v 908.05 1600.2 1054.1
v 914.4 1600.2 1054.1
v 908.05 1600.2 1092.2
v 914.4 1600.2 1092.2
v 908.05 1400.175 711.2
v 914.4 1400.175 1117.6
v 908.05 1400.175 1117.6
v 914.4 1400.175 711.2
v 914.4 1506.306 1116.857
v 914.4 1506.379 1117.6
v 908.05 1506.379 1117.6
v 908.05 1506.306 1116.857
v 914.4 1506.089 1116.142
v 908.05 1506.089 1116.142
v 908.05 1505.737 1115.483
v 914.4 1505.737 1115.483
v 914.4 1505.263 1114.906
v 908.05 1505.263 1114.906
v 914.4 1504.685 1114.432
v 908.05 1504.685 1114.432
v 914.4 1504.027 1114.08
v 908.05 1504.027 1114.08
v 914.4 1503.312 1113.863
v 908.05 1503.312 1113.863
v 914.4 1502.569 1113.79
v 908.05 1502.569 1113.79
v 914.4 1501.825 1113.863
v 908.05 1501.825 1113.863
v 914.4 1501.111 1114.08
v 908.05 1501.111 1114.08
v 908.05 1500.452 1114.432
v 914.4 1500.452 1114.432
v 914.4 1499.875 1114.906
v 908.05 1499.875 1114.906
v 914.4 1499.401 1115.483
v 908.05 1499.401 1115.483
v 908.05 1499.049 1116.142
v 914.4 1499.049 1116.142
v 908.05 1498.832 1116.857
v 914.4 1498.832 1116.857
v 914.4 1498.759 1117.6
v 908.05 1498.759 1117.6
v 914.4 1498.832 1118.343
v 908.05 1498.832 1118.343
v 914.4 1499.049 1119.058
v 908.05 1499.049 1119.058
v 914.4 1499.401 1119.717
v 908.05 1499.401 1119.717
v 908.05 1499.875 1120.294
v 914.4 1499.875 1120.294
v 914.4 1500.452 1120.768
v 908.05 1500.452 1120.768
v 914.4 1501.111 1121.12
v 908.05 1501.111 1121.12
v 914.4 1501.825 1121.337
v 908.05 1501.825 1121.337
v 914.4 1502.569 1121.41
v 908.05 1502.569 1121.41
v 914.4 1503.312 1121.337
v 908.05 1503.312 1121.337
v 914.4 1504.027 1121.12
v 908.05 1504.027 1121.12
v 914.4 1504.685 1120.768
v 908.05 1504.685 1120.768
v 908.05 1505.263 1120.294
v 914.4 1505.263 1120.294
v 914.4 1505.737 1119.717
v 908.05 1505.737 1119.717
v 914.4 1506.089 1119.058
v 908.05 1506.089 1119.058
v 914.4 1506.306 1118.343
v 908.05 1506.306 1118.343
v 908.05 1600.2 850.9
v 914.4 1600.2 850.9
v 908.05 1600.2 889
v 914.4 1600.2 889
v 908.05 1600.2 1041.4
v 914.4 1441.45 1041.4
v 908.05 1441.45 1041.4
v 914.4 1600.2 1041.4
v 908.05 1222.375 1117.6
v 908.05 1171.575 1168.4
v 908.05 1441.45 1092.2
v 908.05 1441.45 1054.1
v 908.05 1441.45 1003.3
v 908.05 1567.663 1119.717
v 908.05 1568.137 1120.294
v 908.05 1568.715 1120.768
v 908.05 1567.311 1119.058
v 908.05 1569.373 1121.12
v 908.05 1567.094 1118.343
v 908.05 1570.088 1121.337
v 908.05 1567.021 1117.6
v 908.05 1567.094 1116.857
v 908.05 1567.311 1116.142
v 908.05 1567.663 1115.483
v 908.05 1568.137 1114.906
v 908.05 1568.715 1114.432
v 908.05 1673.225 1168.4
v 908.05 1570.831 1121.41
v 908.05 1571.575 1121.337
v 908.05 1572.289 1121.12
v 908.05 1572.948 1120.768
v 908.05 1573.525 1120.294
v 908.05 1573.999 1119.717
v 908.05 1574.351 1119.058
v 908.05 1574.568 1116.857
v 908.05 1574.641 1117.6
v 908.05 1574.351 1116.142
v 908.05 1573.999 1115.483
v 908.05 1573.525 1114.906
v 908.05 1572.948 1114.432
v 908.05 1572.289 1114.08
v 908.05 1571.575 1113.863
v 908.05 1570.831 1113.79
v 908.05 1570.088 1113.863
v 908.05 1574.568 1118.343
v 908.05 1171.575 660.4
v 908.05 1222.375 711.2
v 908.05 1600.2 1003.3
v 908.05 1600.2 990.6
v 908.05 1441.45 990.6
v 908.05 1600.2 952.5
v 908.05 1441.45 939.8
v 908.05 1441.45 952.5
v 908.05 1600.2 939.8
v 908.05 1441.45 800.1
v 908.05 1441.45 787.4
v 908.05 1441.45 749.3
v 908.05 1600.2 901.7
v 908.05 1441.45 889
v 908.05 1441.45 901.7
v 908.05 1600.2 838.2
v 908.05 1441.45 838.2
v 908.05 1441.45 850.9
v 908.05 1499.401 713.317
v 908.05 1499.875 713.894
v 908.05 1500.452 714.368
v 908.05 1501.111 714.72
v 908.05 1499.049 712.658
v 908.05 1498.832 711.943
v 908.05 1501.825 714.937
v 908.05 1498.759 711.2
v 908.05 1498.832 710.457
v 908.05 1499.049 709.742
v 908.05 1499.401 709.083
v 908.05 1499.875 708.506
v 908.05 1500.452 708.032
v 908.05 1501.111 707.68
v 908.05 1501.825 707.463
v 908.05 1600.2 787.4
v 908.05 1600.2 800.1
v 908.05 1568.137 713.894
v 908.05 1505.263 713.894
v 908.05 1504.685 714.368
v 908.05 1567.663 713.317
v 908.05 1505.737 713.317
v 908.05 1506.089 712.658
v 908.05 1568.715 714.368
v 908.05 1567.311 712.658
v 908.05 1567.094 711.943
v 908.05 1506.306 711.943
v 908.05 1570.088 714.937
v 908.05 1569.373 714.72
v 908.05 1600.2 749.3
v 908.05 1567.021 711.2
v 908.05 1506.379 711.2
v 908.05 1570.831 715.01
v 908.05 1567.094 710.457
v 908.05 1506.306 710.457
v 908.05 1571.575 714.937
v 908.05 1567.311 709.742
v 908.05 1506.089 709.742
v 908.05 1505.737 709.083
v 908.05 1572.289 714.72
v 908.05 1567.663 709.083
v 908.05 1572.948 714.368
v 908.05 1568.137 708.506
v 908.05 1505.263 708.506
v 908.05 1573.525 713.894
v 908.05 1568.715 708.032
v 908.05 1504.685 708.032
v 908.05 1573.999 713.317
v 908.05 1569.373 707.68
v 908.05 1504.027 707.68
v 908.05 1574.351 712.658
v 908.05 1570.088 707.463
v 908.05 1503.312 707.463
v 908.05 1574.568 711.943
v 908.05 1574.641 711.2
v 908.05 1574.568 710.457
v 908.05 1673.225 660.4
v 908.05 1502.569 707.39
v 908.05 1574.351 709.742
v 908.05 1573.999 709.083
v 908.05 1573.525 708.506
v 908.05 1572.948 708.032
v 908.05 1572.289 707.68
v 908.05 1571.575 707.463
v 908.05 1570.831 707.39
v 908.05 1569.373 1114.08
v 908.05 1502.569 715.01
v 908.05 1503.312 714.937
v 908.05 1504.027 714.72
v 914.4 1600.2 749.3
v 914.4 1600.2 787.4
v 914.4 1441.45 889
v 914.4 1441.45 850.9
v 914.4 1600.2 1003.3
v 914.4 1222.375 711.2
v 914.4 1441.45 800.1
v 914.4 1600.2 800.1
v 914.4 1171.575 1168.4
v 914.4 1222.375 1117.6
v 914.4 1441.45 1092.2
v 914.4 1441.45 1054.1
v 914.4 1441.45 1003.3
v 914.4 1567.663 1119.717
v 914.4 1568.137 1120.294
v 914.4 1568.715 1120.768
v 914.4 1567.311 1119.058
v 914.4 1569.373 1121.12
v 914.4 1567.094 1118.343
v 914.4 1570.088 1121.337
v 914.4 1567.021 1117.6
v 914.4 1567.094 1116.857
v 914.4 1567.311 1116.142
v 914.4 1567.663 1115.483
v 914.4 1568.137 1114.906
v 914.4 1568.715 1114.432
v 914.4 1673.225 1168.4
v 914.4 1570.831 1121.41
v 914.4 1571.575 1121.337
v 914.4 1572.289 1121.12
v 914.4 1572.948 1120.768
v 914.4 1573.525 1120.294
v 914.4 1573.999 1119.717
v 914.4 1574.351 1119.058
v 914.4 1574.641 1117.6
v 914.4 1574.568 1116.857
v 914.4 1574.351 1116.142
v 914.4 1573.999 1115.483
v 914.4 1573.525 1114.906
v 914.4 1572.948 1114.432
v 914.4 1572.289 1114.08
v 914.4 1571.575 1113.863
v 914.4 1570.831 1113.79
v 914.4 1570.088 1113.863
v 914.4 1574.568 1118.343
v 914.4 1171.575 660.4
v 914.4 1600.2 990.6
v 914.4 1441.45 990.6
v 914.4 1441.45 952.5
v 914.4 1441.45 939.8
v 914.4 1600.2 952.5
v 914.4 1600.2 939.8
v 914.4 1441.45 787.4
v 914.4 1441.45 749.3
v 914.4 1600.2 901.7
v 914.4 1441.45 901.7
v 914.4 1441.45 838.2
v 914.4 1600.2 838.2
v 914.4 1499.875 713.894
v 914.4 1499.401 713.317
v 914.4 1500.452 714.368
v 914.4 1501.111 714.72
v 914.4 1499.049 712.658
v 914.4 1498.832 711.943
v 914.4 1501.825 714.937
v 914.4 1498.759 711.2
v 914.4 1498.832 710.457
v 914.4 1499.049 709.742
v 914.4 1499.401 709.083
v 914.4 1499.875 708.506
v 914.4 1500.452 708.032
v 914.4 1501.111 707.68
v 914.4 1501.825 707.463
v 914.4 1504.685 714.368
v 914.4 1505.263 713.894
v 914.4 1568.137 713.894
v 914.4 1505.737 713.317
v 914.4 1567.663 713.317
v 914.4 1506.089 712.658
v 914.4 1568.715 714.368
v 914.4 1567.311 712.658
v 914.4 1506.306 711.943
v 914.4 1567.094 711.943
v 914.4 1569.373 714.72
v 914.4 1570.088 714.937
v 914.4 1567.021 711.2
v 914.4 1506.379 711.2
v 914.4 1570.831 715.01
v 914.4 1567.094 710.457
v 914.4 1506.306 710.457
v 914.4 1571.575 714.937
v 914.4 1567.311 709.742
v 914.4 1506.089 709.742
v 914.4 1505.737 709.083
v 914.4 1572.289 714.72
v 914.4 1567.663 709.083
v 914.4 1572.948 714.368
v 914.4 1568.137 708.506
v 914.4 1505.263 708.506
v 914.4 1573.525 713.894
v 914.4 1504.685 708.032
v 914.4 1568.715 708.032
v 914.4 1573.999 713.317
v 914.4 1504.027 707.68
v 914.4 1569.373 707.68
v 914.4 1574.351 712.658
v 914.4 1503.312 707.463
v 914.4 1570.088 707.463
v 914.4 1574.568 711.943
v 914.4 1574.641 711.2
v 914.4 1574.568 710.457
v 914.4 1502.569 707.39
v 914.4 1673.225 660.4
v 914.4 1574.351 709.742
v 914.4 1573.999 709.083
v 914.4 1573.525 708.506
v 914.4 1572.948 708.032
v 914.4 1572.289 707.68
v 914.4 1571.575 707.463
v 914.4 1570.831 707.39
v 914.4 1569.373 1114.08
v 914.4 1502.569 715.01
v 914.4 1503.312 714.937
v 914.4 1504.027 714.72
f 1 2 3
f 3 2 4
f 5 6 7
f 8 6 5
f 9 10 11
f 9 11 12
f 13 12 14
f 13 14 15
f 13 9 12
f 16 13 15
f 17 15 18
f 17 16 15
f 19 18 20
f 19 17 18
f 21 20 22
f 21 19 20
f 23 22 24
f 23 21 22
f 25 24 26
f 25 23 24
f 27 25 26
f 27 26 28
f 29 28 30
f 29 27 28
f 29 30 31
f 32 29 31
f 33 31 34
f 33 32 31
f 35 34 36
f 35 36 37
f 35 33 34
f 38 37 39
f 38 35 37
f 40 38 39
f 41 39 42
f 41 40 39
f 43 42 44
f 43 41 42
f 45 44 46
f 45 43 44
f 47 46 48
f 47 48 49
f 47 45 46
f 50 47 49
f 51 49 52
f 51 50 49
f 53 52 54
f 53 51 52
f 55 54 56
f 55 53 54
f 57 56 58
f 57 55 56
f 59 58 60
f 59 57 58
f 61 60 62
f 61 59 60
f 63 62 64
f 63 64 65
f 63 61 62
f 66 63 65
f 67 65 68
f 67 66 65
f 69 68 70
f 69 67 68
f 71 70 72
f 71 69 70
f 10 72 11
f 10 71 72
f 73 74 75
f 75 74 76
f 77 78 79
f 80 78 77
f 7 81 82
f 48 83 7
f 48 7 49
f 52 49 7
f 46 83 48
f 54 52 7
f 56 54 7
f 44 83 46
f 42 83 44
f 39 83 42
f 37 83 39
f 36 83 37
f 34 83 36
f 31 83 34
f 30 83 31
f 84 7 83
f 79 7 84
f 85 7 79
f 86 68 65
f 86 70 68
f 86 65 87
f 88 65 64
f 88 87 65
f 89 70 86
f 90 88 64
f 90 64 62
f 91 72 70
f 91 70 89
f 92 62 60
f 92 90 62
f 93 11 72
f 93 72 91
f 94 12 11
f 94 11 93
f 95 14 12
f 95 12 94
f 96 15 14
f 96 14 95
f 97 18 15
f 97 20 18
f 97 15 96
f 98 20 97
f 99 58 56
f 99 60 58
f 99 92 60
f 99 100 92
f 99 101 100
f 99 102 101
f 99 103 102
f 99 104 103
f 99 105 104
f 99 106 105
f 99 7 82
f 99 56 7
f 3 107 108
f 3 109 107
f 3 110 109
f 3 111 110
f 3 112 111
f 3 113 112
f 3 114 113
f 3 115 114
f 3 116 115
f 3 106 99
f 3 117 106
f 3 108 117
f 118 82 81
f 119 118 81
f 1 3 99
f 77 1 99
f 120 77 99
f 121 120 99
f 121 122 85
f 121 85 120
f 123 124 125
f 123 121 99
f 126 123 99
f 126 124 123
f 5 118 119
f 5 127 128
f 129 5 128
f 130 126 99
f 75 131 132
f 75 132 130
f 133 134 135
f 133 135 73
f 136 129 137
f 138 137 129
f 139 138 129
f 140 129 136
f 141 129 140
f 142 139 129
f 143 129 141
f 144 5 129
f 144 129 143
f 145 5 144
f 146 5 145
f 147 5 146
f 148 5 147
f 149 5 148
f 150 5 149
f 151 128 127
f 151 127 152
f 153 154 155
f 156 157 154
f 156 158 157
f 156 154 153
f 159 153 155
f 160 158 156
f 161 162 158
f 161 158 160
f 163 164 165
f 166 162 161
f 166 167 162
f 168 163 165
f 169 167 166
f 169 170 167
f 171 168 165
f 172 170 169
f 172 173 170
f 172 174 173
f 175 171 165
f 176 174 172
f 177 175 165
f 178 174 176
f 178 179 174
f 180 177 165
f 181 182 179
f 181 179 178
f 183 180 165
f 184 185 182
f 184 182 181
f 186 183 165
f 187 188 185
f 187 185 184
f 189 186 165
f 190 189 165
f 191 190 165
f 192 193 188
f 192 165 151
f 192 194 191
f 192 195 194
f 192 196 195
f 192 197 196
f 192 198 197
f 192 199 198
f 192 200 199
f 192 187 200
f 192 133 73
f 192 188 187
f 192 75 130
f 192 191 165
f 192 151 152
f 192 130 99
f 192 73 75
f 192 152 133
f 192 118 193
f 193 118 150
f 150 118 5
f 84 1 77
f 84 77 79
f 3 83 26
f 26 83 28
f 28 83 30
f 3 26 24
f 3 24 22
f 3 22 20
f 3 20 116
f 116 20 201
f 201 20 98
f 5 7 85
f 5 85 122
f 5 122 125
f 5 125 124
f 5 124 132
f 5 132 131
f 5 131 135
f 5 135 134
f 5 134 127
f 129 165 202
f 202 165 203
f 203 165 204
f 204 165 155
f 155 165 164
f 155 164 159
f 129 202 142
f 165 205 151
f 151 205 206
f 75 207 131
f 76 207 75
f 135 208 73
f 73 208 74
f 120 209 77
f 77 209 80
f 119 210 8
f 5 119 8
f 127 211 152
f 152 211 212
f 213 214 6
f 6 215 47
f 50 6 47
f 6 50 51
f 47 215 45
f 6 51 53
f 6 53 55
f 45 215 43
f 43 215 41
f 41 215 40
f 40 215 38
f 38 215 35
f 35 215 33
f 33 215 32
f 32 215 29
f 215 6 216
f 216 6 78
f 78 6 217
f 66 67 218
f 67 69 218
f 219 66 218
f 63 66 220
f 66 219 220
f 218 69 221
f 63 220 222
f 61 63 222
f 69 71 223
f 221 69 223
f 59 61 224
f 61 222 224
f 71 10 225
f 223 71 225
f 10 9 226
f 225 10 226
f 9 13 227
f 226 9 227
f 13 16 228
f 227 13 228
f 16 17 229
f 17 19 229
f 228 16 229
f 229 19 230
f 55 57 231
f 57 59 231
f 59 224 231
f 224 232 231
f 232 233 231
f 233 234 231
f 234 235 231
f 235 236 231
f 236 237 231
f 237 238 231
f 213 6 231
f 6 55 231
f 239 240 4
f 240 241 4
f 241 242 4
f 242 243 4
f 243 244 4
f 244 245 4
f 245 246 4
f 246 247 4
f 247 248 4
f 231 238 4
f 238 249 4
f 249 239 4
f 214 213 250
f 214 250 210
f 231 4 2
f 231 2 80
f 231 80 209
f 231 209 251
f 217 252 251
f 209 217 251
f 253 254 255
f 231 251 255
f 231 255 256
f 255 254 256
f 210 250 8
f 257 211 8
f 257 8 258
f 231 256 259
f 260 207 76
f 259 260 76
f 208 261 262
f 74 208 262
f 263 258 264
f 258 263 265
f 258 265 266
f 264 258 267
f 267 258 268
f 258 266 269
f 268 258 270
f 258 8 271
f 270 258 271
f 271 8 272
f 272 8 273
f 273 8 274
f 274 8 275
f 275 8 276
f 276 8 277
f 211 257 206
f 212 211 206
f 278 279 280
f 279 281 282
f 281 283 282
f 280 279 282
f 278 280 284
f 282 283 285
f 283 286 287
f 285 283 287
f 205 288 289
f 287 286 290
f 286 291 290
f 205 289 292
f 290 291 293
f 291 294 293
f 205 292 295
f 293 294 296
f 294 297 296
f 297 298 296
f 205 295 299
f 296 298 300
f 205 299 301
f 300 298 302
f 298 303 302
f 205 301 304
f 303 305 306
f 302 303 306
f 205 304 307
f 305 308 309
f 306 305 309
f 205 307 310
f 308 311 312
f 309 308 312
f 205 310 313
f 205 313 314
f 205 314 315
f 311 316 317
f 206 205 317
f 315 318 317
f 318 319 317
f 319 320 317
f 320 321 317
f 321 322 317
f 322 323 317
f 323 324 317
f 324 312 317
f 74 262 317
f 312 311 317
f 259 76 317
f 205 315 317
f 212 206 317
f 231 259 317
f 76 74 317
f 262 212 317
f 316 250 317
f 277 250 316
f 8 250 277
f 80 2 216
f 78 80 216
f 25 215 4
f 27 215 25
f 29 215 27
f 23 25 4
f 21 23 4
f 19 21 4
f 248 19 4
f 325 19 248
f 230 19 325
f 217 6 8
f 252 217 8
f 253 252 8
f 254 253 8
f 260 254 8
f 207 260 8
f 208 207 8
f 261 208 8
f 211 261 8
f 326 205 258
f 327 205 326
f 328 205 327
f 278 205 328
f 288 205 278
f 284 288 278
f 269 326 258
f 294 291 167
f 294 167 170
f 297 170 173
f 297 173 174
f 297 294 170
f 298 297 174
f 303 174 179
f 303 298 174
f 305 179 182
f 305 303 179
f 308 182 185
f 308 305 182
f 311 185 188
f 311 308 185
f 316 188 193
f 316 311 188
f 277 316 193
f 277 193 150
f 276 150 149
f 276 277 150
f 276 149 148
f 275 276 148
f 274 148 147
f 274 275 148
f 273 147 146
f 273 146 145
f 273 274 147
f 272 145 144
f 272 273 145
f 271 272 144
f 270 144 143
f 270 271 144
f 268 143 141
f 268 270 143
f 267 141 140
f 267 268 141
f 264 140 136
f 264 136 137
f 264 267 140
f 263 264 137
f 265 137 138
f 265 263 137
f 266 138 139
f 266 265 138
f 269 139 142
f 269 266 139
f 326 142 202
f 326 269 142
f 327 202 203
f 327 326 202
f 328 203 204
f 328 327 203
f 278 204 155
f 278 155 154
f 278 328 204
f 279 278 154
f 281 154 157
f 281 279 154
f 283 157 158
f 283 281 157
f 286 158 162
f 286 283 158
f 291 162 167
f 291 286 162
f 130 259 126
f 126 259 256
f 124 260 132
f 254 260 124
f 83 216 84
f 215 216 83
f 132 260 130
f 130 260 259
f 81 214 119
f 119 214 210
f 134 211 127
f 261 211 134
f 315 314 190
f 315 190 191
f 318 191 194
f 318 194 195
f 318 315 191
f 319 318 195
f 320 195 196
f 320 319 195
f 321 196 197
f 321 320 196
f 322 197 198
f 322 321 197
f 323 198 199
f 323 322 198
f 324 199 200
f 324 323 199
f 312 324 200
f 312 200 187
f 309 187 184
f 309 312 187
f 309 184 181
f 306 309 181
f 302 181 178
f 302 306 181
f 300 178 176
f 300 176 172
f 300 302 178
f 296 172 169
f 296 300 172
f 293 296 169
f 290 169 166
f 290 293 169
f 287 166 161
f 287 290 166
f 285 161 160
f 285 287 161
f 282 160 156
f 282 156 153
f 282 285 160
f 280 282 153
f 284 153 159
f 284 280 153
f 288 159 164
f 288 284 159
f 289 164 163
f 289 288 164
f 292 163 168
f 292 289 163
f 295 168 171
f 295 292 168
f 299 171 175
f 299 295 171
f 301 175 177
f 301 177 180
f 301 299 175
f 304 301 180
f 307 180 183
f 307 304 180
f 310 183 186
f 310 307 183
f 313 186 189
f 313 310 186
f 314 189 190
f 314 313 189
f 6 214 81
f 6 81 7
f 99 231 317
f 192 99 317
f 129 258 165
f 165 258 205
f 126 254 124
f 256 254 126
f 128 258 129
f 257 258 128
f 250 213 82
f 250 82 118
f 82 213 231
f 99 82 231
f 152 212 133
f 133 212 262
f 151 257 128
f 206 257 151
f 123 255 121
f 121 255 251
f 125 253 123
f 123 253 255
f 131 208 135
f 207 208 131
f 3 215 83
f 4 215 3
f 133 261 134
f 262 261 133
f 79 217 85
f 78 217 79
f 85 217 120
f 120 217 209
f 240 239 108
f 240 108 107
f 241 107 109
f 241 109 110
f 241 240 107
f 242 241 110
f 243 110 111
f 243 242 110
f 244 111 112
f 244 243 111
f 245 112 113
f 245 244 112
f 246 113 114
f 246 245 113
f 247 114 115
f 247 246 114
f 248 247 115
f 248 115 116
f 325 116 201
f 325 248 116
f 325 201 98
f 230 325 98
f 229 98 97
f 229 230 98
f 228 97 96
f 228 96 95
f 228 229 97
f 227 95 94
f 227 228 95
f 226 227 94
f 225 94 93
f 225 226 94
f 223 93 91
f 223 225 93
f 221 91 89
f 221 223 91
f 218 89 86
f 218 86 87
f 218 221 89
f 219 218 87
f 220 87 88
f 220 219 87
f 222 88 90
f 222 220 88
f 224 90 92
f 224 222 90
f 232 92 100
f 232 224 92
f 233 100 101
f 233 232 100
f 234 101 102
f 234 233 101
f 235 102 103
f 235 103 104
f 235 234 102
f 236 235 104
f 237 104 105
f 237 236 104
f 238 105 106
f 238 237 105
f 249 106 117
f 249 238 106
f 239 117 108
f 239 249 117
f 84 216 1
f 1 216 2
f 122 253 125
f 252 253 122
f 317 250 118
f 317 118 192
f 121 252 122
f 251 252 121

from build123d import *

# Parameters (mm, degrees)
SKETCH001_W         = 501.65
SKETCH001_H         = 508
SKETCH001_R         = 3.81
SKETCH001_W_2       = 177.8
SKETCH001_H_2       = 406.4
PAD007_DEPTH        = 6.35
SKETCH005_W         = 158.75
SKETCH005_H         = 38.1
POCKET_DEPTH        = 6.35
LINEARPATTERN_COUNT = 7
LINEARPATTERN_PITCH = 50.8


with BuildPart() as part:
    # Sketch001 → Pad007 (new body)
    with BuildSketch(Plane(origin=(914.4, 1422.4, 914.4), x_dir=(0, 1, 0), z_dir=(-1, 0, 0))):
        Rectangle(SKETCH001_W, SKETCH001_H)
        with Locations((80.16875, 203.2)):
            Circle(SKETCH001_R, mode=Mode.SUBTRACT)
        with Locations((148.43125, 203.2)):
            Circle(SKETCH001_R, mode=Mode.SUBTRACT)
        with Locations((80.16875, -203.2)):
            Circle(SKETCH001_R, mode=Mode.SUBTRACT)
        with Locations((148.43125, -203.2)):
            Circle(SKETCH001_R, mode=Mode.SUBTRACT)
        with Locations((-111.125, 0)):
            Rectangle(SKETCH001_W_2, SKETCH001_H_2, mode=Mode.SUBTRACT)
    extrude(amount=PAD007_DEPTH)

    # Sketch005 → Pocket (cut)
    with BuildSketch(Plane(origin=(914.4, 1422.4, 914.4), x_dir=(0, 1, 0), z_dir=(1, 0, 0))):
        with Locations((98.425, 158.75)):
            Rectangle(SKETCH005_W, SKETCH005_H)
    pocket = extrude(amount=-POCKET_DEPTH, mode=Mode.SUBTRACT)

    # LinearPattern: Pocket ×7
    with Locations(*[(0, 0, -i * LINEARPATTERN_PITCH) for i in range(1, LINEARPATTERN_COUNT)]):
        add(pocket, mode=Mode.SUBTRACT)


solid = part.part
